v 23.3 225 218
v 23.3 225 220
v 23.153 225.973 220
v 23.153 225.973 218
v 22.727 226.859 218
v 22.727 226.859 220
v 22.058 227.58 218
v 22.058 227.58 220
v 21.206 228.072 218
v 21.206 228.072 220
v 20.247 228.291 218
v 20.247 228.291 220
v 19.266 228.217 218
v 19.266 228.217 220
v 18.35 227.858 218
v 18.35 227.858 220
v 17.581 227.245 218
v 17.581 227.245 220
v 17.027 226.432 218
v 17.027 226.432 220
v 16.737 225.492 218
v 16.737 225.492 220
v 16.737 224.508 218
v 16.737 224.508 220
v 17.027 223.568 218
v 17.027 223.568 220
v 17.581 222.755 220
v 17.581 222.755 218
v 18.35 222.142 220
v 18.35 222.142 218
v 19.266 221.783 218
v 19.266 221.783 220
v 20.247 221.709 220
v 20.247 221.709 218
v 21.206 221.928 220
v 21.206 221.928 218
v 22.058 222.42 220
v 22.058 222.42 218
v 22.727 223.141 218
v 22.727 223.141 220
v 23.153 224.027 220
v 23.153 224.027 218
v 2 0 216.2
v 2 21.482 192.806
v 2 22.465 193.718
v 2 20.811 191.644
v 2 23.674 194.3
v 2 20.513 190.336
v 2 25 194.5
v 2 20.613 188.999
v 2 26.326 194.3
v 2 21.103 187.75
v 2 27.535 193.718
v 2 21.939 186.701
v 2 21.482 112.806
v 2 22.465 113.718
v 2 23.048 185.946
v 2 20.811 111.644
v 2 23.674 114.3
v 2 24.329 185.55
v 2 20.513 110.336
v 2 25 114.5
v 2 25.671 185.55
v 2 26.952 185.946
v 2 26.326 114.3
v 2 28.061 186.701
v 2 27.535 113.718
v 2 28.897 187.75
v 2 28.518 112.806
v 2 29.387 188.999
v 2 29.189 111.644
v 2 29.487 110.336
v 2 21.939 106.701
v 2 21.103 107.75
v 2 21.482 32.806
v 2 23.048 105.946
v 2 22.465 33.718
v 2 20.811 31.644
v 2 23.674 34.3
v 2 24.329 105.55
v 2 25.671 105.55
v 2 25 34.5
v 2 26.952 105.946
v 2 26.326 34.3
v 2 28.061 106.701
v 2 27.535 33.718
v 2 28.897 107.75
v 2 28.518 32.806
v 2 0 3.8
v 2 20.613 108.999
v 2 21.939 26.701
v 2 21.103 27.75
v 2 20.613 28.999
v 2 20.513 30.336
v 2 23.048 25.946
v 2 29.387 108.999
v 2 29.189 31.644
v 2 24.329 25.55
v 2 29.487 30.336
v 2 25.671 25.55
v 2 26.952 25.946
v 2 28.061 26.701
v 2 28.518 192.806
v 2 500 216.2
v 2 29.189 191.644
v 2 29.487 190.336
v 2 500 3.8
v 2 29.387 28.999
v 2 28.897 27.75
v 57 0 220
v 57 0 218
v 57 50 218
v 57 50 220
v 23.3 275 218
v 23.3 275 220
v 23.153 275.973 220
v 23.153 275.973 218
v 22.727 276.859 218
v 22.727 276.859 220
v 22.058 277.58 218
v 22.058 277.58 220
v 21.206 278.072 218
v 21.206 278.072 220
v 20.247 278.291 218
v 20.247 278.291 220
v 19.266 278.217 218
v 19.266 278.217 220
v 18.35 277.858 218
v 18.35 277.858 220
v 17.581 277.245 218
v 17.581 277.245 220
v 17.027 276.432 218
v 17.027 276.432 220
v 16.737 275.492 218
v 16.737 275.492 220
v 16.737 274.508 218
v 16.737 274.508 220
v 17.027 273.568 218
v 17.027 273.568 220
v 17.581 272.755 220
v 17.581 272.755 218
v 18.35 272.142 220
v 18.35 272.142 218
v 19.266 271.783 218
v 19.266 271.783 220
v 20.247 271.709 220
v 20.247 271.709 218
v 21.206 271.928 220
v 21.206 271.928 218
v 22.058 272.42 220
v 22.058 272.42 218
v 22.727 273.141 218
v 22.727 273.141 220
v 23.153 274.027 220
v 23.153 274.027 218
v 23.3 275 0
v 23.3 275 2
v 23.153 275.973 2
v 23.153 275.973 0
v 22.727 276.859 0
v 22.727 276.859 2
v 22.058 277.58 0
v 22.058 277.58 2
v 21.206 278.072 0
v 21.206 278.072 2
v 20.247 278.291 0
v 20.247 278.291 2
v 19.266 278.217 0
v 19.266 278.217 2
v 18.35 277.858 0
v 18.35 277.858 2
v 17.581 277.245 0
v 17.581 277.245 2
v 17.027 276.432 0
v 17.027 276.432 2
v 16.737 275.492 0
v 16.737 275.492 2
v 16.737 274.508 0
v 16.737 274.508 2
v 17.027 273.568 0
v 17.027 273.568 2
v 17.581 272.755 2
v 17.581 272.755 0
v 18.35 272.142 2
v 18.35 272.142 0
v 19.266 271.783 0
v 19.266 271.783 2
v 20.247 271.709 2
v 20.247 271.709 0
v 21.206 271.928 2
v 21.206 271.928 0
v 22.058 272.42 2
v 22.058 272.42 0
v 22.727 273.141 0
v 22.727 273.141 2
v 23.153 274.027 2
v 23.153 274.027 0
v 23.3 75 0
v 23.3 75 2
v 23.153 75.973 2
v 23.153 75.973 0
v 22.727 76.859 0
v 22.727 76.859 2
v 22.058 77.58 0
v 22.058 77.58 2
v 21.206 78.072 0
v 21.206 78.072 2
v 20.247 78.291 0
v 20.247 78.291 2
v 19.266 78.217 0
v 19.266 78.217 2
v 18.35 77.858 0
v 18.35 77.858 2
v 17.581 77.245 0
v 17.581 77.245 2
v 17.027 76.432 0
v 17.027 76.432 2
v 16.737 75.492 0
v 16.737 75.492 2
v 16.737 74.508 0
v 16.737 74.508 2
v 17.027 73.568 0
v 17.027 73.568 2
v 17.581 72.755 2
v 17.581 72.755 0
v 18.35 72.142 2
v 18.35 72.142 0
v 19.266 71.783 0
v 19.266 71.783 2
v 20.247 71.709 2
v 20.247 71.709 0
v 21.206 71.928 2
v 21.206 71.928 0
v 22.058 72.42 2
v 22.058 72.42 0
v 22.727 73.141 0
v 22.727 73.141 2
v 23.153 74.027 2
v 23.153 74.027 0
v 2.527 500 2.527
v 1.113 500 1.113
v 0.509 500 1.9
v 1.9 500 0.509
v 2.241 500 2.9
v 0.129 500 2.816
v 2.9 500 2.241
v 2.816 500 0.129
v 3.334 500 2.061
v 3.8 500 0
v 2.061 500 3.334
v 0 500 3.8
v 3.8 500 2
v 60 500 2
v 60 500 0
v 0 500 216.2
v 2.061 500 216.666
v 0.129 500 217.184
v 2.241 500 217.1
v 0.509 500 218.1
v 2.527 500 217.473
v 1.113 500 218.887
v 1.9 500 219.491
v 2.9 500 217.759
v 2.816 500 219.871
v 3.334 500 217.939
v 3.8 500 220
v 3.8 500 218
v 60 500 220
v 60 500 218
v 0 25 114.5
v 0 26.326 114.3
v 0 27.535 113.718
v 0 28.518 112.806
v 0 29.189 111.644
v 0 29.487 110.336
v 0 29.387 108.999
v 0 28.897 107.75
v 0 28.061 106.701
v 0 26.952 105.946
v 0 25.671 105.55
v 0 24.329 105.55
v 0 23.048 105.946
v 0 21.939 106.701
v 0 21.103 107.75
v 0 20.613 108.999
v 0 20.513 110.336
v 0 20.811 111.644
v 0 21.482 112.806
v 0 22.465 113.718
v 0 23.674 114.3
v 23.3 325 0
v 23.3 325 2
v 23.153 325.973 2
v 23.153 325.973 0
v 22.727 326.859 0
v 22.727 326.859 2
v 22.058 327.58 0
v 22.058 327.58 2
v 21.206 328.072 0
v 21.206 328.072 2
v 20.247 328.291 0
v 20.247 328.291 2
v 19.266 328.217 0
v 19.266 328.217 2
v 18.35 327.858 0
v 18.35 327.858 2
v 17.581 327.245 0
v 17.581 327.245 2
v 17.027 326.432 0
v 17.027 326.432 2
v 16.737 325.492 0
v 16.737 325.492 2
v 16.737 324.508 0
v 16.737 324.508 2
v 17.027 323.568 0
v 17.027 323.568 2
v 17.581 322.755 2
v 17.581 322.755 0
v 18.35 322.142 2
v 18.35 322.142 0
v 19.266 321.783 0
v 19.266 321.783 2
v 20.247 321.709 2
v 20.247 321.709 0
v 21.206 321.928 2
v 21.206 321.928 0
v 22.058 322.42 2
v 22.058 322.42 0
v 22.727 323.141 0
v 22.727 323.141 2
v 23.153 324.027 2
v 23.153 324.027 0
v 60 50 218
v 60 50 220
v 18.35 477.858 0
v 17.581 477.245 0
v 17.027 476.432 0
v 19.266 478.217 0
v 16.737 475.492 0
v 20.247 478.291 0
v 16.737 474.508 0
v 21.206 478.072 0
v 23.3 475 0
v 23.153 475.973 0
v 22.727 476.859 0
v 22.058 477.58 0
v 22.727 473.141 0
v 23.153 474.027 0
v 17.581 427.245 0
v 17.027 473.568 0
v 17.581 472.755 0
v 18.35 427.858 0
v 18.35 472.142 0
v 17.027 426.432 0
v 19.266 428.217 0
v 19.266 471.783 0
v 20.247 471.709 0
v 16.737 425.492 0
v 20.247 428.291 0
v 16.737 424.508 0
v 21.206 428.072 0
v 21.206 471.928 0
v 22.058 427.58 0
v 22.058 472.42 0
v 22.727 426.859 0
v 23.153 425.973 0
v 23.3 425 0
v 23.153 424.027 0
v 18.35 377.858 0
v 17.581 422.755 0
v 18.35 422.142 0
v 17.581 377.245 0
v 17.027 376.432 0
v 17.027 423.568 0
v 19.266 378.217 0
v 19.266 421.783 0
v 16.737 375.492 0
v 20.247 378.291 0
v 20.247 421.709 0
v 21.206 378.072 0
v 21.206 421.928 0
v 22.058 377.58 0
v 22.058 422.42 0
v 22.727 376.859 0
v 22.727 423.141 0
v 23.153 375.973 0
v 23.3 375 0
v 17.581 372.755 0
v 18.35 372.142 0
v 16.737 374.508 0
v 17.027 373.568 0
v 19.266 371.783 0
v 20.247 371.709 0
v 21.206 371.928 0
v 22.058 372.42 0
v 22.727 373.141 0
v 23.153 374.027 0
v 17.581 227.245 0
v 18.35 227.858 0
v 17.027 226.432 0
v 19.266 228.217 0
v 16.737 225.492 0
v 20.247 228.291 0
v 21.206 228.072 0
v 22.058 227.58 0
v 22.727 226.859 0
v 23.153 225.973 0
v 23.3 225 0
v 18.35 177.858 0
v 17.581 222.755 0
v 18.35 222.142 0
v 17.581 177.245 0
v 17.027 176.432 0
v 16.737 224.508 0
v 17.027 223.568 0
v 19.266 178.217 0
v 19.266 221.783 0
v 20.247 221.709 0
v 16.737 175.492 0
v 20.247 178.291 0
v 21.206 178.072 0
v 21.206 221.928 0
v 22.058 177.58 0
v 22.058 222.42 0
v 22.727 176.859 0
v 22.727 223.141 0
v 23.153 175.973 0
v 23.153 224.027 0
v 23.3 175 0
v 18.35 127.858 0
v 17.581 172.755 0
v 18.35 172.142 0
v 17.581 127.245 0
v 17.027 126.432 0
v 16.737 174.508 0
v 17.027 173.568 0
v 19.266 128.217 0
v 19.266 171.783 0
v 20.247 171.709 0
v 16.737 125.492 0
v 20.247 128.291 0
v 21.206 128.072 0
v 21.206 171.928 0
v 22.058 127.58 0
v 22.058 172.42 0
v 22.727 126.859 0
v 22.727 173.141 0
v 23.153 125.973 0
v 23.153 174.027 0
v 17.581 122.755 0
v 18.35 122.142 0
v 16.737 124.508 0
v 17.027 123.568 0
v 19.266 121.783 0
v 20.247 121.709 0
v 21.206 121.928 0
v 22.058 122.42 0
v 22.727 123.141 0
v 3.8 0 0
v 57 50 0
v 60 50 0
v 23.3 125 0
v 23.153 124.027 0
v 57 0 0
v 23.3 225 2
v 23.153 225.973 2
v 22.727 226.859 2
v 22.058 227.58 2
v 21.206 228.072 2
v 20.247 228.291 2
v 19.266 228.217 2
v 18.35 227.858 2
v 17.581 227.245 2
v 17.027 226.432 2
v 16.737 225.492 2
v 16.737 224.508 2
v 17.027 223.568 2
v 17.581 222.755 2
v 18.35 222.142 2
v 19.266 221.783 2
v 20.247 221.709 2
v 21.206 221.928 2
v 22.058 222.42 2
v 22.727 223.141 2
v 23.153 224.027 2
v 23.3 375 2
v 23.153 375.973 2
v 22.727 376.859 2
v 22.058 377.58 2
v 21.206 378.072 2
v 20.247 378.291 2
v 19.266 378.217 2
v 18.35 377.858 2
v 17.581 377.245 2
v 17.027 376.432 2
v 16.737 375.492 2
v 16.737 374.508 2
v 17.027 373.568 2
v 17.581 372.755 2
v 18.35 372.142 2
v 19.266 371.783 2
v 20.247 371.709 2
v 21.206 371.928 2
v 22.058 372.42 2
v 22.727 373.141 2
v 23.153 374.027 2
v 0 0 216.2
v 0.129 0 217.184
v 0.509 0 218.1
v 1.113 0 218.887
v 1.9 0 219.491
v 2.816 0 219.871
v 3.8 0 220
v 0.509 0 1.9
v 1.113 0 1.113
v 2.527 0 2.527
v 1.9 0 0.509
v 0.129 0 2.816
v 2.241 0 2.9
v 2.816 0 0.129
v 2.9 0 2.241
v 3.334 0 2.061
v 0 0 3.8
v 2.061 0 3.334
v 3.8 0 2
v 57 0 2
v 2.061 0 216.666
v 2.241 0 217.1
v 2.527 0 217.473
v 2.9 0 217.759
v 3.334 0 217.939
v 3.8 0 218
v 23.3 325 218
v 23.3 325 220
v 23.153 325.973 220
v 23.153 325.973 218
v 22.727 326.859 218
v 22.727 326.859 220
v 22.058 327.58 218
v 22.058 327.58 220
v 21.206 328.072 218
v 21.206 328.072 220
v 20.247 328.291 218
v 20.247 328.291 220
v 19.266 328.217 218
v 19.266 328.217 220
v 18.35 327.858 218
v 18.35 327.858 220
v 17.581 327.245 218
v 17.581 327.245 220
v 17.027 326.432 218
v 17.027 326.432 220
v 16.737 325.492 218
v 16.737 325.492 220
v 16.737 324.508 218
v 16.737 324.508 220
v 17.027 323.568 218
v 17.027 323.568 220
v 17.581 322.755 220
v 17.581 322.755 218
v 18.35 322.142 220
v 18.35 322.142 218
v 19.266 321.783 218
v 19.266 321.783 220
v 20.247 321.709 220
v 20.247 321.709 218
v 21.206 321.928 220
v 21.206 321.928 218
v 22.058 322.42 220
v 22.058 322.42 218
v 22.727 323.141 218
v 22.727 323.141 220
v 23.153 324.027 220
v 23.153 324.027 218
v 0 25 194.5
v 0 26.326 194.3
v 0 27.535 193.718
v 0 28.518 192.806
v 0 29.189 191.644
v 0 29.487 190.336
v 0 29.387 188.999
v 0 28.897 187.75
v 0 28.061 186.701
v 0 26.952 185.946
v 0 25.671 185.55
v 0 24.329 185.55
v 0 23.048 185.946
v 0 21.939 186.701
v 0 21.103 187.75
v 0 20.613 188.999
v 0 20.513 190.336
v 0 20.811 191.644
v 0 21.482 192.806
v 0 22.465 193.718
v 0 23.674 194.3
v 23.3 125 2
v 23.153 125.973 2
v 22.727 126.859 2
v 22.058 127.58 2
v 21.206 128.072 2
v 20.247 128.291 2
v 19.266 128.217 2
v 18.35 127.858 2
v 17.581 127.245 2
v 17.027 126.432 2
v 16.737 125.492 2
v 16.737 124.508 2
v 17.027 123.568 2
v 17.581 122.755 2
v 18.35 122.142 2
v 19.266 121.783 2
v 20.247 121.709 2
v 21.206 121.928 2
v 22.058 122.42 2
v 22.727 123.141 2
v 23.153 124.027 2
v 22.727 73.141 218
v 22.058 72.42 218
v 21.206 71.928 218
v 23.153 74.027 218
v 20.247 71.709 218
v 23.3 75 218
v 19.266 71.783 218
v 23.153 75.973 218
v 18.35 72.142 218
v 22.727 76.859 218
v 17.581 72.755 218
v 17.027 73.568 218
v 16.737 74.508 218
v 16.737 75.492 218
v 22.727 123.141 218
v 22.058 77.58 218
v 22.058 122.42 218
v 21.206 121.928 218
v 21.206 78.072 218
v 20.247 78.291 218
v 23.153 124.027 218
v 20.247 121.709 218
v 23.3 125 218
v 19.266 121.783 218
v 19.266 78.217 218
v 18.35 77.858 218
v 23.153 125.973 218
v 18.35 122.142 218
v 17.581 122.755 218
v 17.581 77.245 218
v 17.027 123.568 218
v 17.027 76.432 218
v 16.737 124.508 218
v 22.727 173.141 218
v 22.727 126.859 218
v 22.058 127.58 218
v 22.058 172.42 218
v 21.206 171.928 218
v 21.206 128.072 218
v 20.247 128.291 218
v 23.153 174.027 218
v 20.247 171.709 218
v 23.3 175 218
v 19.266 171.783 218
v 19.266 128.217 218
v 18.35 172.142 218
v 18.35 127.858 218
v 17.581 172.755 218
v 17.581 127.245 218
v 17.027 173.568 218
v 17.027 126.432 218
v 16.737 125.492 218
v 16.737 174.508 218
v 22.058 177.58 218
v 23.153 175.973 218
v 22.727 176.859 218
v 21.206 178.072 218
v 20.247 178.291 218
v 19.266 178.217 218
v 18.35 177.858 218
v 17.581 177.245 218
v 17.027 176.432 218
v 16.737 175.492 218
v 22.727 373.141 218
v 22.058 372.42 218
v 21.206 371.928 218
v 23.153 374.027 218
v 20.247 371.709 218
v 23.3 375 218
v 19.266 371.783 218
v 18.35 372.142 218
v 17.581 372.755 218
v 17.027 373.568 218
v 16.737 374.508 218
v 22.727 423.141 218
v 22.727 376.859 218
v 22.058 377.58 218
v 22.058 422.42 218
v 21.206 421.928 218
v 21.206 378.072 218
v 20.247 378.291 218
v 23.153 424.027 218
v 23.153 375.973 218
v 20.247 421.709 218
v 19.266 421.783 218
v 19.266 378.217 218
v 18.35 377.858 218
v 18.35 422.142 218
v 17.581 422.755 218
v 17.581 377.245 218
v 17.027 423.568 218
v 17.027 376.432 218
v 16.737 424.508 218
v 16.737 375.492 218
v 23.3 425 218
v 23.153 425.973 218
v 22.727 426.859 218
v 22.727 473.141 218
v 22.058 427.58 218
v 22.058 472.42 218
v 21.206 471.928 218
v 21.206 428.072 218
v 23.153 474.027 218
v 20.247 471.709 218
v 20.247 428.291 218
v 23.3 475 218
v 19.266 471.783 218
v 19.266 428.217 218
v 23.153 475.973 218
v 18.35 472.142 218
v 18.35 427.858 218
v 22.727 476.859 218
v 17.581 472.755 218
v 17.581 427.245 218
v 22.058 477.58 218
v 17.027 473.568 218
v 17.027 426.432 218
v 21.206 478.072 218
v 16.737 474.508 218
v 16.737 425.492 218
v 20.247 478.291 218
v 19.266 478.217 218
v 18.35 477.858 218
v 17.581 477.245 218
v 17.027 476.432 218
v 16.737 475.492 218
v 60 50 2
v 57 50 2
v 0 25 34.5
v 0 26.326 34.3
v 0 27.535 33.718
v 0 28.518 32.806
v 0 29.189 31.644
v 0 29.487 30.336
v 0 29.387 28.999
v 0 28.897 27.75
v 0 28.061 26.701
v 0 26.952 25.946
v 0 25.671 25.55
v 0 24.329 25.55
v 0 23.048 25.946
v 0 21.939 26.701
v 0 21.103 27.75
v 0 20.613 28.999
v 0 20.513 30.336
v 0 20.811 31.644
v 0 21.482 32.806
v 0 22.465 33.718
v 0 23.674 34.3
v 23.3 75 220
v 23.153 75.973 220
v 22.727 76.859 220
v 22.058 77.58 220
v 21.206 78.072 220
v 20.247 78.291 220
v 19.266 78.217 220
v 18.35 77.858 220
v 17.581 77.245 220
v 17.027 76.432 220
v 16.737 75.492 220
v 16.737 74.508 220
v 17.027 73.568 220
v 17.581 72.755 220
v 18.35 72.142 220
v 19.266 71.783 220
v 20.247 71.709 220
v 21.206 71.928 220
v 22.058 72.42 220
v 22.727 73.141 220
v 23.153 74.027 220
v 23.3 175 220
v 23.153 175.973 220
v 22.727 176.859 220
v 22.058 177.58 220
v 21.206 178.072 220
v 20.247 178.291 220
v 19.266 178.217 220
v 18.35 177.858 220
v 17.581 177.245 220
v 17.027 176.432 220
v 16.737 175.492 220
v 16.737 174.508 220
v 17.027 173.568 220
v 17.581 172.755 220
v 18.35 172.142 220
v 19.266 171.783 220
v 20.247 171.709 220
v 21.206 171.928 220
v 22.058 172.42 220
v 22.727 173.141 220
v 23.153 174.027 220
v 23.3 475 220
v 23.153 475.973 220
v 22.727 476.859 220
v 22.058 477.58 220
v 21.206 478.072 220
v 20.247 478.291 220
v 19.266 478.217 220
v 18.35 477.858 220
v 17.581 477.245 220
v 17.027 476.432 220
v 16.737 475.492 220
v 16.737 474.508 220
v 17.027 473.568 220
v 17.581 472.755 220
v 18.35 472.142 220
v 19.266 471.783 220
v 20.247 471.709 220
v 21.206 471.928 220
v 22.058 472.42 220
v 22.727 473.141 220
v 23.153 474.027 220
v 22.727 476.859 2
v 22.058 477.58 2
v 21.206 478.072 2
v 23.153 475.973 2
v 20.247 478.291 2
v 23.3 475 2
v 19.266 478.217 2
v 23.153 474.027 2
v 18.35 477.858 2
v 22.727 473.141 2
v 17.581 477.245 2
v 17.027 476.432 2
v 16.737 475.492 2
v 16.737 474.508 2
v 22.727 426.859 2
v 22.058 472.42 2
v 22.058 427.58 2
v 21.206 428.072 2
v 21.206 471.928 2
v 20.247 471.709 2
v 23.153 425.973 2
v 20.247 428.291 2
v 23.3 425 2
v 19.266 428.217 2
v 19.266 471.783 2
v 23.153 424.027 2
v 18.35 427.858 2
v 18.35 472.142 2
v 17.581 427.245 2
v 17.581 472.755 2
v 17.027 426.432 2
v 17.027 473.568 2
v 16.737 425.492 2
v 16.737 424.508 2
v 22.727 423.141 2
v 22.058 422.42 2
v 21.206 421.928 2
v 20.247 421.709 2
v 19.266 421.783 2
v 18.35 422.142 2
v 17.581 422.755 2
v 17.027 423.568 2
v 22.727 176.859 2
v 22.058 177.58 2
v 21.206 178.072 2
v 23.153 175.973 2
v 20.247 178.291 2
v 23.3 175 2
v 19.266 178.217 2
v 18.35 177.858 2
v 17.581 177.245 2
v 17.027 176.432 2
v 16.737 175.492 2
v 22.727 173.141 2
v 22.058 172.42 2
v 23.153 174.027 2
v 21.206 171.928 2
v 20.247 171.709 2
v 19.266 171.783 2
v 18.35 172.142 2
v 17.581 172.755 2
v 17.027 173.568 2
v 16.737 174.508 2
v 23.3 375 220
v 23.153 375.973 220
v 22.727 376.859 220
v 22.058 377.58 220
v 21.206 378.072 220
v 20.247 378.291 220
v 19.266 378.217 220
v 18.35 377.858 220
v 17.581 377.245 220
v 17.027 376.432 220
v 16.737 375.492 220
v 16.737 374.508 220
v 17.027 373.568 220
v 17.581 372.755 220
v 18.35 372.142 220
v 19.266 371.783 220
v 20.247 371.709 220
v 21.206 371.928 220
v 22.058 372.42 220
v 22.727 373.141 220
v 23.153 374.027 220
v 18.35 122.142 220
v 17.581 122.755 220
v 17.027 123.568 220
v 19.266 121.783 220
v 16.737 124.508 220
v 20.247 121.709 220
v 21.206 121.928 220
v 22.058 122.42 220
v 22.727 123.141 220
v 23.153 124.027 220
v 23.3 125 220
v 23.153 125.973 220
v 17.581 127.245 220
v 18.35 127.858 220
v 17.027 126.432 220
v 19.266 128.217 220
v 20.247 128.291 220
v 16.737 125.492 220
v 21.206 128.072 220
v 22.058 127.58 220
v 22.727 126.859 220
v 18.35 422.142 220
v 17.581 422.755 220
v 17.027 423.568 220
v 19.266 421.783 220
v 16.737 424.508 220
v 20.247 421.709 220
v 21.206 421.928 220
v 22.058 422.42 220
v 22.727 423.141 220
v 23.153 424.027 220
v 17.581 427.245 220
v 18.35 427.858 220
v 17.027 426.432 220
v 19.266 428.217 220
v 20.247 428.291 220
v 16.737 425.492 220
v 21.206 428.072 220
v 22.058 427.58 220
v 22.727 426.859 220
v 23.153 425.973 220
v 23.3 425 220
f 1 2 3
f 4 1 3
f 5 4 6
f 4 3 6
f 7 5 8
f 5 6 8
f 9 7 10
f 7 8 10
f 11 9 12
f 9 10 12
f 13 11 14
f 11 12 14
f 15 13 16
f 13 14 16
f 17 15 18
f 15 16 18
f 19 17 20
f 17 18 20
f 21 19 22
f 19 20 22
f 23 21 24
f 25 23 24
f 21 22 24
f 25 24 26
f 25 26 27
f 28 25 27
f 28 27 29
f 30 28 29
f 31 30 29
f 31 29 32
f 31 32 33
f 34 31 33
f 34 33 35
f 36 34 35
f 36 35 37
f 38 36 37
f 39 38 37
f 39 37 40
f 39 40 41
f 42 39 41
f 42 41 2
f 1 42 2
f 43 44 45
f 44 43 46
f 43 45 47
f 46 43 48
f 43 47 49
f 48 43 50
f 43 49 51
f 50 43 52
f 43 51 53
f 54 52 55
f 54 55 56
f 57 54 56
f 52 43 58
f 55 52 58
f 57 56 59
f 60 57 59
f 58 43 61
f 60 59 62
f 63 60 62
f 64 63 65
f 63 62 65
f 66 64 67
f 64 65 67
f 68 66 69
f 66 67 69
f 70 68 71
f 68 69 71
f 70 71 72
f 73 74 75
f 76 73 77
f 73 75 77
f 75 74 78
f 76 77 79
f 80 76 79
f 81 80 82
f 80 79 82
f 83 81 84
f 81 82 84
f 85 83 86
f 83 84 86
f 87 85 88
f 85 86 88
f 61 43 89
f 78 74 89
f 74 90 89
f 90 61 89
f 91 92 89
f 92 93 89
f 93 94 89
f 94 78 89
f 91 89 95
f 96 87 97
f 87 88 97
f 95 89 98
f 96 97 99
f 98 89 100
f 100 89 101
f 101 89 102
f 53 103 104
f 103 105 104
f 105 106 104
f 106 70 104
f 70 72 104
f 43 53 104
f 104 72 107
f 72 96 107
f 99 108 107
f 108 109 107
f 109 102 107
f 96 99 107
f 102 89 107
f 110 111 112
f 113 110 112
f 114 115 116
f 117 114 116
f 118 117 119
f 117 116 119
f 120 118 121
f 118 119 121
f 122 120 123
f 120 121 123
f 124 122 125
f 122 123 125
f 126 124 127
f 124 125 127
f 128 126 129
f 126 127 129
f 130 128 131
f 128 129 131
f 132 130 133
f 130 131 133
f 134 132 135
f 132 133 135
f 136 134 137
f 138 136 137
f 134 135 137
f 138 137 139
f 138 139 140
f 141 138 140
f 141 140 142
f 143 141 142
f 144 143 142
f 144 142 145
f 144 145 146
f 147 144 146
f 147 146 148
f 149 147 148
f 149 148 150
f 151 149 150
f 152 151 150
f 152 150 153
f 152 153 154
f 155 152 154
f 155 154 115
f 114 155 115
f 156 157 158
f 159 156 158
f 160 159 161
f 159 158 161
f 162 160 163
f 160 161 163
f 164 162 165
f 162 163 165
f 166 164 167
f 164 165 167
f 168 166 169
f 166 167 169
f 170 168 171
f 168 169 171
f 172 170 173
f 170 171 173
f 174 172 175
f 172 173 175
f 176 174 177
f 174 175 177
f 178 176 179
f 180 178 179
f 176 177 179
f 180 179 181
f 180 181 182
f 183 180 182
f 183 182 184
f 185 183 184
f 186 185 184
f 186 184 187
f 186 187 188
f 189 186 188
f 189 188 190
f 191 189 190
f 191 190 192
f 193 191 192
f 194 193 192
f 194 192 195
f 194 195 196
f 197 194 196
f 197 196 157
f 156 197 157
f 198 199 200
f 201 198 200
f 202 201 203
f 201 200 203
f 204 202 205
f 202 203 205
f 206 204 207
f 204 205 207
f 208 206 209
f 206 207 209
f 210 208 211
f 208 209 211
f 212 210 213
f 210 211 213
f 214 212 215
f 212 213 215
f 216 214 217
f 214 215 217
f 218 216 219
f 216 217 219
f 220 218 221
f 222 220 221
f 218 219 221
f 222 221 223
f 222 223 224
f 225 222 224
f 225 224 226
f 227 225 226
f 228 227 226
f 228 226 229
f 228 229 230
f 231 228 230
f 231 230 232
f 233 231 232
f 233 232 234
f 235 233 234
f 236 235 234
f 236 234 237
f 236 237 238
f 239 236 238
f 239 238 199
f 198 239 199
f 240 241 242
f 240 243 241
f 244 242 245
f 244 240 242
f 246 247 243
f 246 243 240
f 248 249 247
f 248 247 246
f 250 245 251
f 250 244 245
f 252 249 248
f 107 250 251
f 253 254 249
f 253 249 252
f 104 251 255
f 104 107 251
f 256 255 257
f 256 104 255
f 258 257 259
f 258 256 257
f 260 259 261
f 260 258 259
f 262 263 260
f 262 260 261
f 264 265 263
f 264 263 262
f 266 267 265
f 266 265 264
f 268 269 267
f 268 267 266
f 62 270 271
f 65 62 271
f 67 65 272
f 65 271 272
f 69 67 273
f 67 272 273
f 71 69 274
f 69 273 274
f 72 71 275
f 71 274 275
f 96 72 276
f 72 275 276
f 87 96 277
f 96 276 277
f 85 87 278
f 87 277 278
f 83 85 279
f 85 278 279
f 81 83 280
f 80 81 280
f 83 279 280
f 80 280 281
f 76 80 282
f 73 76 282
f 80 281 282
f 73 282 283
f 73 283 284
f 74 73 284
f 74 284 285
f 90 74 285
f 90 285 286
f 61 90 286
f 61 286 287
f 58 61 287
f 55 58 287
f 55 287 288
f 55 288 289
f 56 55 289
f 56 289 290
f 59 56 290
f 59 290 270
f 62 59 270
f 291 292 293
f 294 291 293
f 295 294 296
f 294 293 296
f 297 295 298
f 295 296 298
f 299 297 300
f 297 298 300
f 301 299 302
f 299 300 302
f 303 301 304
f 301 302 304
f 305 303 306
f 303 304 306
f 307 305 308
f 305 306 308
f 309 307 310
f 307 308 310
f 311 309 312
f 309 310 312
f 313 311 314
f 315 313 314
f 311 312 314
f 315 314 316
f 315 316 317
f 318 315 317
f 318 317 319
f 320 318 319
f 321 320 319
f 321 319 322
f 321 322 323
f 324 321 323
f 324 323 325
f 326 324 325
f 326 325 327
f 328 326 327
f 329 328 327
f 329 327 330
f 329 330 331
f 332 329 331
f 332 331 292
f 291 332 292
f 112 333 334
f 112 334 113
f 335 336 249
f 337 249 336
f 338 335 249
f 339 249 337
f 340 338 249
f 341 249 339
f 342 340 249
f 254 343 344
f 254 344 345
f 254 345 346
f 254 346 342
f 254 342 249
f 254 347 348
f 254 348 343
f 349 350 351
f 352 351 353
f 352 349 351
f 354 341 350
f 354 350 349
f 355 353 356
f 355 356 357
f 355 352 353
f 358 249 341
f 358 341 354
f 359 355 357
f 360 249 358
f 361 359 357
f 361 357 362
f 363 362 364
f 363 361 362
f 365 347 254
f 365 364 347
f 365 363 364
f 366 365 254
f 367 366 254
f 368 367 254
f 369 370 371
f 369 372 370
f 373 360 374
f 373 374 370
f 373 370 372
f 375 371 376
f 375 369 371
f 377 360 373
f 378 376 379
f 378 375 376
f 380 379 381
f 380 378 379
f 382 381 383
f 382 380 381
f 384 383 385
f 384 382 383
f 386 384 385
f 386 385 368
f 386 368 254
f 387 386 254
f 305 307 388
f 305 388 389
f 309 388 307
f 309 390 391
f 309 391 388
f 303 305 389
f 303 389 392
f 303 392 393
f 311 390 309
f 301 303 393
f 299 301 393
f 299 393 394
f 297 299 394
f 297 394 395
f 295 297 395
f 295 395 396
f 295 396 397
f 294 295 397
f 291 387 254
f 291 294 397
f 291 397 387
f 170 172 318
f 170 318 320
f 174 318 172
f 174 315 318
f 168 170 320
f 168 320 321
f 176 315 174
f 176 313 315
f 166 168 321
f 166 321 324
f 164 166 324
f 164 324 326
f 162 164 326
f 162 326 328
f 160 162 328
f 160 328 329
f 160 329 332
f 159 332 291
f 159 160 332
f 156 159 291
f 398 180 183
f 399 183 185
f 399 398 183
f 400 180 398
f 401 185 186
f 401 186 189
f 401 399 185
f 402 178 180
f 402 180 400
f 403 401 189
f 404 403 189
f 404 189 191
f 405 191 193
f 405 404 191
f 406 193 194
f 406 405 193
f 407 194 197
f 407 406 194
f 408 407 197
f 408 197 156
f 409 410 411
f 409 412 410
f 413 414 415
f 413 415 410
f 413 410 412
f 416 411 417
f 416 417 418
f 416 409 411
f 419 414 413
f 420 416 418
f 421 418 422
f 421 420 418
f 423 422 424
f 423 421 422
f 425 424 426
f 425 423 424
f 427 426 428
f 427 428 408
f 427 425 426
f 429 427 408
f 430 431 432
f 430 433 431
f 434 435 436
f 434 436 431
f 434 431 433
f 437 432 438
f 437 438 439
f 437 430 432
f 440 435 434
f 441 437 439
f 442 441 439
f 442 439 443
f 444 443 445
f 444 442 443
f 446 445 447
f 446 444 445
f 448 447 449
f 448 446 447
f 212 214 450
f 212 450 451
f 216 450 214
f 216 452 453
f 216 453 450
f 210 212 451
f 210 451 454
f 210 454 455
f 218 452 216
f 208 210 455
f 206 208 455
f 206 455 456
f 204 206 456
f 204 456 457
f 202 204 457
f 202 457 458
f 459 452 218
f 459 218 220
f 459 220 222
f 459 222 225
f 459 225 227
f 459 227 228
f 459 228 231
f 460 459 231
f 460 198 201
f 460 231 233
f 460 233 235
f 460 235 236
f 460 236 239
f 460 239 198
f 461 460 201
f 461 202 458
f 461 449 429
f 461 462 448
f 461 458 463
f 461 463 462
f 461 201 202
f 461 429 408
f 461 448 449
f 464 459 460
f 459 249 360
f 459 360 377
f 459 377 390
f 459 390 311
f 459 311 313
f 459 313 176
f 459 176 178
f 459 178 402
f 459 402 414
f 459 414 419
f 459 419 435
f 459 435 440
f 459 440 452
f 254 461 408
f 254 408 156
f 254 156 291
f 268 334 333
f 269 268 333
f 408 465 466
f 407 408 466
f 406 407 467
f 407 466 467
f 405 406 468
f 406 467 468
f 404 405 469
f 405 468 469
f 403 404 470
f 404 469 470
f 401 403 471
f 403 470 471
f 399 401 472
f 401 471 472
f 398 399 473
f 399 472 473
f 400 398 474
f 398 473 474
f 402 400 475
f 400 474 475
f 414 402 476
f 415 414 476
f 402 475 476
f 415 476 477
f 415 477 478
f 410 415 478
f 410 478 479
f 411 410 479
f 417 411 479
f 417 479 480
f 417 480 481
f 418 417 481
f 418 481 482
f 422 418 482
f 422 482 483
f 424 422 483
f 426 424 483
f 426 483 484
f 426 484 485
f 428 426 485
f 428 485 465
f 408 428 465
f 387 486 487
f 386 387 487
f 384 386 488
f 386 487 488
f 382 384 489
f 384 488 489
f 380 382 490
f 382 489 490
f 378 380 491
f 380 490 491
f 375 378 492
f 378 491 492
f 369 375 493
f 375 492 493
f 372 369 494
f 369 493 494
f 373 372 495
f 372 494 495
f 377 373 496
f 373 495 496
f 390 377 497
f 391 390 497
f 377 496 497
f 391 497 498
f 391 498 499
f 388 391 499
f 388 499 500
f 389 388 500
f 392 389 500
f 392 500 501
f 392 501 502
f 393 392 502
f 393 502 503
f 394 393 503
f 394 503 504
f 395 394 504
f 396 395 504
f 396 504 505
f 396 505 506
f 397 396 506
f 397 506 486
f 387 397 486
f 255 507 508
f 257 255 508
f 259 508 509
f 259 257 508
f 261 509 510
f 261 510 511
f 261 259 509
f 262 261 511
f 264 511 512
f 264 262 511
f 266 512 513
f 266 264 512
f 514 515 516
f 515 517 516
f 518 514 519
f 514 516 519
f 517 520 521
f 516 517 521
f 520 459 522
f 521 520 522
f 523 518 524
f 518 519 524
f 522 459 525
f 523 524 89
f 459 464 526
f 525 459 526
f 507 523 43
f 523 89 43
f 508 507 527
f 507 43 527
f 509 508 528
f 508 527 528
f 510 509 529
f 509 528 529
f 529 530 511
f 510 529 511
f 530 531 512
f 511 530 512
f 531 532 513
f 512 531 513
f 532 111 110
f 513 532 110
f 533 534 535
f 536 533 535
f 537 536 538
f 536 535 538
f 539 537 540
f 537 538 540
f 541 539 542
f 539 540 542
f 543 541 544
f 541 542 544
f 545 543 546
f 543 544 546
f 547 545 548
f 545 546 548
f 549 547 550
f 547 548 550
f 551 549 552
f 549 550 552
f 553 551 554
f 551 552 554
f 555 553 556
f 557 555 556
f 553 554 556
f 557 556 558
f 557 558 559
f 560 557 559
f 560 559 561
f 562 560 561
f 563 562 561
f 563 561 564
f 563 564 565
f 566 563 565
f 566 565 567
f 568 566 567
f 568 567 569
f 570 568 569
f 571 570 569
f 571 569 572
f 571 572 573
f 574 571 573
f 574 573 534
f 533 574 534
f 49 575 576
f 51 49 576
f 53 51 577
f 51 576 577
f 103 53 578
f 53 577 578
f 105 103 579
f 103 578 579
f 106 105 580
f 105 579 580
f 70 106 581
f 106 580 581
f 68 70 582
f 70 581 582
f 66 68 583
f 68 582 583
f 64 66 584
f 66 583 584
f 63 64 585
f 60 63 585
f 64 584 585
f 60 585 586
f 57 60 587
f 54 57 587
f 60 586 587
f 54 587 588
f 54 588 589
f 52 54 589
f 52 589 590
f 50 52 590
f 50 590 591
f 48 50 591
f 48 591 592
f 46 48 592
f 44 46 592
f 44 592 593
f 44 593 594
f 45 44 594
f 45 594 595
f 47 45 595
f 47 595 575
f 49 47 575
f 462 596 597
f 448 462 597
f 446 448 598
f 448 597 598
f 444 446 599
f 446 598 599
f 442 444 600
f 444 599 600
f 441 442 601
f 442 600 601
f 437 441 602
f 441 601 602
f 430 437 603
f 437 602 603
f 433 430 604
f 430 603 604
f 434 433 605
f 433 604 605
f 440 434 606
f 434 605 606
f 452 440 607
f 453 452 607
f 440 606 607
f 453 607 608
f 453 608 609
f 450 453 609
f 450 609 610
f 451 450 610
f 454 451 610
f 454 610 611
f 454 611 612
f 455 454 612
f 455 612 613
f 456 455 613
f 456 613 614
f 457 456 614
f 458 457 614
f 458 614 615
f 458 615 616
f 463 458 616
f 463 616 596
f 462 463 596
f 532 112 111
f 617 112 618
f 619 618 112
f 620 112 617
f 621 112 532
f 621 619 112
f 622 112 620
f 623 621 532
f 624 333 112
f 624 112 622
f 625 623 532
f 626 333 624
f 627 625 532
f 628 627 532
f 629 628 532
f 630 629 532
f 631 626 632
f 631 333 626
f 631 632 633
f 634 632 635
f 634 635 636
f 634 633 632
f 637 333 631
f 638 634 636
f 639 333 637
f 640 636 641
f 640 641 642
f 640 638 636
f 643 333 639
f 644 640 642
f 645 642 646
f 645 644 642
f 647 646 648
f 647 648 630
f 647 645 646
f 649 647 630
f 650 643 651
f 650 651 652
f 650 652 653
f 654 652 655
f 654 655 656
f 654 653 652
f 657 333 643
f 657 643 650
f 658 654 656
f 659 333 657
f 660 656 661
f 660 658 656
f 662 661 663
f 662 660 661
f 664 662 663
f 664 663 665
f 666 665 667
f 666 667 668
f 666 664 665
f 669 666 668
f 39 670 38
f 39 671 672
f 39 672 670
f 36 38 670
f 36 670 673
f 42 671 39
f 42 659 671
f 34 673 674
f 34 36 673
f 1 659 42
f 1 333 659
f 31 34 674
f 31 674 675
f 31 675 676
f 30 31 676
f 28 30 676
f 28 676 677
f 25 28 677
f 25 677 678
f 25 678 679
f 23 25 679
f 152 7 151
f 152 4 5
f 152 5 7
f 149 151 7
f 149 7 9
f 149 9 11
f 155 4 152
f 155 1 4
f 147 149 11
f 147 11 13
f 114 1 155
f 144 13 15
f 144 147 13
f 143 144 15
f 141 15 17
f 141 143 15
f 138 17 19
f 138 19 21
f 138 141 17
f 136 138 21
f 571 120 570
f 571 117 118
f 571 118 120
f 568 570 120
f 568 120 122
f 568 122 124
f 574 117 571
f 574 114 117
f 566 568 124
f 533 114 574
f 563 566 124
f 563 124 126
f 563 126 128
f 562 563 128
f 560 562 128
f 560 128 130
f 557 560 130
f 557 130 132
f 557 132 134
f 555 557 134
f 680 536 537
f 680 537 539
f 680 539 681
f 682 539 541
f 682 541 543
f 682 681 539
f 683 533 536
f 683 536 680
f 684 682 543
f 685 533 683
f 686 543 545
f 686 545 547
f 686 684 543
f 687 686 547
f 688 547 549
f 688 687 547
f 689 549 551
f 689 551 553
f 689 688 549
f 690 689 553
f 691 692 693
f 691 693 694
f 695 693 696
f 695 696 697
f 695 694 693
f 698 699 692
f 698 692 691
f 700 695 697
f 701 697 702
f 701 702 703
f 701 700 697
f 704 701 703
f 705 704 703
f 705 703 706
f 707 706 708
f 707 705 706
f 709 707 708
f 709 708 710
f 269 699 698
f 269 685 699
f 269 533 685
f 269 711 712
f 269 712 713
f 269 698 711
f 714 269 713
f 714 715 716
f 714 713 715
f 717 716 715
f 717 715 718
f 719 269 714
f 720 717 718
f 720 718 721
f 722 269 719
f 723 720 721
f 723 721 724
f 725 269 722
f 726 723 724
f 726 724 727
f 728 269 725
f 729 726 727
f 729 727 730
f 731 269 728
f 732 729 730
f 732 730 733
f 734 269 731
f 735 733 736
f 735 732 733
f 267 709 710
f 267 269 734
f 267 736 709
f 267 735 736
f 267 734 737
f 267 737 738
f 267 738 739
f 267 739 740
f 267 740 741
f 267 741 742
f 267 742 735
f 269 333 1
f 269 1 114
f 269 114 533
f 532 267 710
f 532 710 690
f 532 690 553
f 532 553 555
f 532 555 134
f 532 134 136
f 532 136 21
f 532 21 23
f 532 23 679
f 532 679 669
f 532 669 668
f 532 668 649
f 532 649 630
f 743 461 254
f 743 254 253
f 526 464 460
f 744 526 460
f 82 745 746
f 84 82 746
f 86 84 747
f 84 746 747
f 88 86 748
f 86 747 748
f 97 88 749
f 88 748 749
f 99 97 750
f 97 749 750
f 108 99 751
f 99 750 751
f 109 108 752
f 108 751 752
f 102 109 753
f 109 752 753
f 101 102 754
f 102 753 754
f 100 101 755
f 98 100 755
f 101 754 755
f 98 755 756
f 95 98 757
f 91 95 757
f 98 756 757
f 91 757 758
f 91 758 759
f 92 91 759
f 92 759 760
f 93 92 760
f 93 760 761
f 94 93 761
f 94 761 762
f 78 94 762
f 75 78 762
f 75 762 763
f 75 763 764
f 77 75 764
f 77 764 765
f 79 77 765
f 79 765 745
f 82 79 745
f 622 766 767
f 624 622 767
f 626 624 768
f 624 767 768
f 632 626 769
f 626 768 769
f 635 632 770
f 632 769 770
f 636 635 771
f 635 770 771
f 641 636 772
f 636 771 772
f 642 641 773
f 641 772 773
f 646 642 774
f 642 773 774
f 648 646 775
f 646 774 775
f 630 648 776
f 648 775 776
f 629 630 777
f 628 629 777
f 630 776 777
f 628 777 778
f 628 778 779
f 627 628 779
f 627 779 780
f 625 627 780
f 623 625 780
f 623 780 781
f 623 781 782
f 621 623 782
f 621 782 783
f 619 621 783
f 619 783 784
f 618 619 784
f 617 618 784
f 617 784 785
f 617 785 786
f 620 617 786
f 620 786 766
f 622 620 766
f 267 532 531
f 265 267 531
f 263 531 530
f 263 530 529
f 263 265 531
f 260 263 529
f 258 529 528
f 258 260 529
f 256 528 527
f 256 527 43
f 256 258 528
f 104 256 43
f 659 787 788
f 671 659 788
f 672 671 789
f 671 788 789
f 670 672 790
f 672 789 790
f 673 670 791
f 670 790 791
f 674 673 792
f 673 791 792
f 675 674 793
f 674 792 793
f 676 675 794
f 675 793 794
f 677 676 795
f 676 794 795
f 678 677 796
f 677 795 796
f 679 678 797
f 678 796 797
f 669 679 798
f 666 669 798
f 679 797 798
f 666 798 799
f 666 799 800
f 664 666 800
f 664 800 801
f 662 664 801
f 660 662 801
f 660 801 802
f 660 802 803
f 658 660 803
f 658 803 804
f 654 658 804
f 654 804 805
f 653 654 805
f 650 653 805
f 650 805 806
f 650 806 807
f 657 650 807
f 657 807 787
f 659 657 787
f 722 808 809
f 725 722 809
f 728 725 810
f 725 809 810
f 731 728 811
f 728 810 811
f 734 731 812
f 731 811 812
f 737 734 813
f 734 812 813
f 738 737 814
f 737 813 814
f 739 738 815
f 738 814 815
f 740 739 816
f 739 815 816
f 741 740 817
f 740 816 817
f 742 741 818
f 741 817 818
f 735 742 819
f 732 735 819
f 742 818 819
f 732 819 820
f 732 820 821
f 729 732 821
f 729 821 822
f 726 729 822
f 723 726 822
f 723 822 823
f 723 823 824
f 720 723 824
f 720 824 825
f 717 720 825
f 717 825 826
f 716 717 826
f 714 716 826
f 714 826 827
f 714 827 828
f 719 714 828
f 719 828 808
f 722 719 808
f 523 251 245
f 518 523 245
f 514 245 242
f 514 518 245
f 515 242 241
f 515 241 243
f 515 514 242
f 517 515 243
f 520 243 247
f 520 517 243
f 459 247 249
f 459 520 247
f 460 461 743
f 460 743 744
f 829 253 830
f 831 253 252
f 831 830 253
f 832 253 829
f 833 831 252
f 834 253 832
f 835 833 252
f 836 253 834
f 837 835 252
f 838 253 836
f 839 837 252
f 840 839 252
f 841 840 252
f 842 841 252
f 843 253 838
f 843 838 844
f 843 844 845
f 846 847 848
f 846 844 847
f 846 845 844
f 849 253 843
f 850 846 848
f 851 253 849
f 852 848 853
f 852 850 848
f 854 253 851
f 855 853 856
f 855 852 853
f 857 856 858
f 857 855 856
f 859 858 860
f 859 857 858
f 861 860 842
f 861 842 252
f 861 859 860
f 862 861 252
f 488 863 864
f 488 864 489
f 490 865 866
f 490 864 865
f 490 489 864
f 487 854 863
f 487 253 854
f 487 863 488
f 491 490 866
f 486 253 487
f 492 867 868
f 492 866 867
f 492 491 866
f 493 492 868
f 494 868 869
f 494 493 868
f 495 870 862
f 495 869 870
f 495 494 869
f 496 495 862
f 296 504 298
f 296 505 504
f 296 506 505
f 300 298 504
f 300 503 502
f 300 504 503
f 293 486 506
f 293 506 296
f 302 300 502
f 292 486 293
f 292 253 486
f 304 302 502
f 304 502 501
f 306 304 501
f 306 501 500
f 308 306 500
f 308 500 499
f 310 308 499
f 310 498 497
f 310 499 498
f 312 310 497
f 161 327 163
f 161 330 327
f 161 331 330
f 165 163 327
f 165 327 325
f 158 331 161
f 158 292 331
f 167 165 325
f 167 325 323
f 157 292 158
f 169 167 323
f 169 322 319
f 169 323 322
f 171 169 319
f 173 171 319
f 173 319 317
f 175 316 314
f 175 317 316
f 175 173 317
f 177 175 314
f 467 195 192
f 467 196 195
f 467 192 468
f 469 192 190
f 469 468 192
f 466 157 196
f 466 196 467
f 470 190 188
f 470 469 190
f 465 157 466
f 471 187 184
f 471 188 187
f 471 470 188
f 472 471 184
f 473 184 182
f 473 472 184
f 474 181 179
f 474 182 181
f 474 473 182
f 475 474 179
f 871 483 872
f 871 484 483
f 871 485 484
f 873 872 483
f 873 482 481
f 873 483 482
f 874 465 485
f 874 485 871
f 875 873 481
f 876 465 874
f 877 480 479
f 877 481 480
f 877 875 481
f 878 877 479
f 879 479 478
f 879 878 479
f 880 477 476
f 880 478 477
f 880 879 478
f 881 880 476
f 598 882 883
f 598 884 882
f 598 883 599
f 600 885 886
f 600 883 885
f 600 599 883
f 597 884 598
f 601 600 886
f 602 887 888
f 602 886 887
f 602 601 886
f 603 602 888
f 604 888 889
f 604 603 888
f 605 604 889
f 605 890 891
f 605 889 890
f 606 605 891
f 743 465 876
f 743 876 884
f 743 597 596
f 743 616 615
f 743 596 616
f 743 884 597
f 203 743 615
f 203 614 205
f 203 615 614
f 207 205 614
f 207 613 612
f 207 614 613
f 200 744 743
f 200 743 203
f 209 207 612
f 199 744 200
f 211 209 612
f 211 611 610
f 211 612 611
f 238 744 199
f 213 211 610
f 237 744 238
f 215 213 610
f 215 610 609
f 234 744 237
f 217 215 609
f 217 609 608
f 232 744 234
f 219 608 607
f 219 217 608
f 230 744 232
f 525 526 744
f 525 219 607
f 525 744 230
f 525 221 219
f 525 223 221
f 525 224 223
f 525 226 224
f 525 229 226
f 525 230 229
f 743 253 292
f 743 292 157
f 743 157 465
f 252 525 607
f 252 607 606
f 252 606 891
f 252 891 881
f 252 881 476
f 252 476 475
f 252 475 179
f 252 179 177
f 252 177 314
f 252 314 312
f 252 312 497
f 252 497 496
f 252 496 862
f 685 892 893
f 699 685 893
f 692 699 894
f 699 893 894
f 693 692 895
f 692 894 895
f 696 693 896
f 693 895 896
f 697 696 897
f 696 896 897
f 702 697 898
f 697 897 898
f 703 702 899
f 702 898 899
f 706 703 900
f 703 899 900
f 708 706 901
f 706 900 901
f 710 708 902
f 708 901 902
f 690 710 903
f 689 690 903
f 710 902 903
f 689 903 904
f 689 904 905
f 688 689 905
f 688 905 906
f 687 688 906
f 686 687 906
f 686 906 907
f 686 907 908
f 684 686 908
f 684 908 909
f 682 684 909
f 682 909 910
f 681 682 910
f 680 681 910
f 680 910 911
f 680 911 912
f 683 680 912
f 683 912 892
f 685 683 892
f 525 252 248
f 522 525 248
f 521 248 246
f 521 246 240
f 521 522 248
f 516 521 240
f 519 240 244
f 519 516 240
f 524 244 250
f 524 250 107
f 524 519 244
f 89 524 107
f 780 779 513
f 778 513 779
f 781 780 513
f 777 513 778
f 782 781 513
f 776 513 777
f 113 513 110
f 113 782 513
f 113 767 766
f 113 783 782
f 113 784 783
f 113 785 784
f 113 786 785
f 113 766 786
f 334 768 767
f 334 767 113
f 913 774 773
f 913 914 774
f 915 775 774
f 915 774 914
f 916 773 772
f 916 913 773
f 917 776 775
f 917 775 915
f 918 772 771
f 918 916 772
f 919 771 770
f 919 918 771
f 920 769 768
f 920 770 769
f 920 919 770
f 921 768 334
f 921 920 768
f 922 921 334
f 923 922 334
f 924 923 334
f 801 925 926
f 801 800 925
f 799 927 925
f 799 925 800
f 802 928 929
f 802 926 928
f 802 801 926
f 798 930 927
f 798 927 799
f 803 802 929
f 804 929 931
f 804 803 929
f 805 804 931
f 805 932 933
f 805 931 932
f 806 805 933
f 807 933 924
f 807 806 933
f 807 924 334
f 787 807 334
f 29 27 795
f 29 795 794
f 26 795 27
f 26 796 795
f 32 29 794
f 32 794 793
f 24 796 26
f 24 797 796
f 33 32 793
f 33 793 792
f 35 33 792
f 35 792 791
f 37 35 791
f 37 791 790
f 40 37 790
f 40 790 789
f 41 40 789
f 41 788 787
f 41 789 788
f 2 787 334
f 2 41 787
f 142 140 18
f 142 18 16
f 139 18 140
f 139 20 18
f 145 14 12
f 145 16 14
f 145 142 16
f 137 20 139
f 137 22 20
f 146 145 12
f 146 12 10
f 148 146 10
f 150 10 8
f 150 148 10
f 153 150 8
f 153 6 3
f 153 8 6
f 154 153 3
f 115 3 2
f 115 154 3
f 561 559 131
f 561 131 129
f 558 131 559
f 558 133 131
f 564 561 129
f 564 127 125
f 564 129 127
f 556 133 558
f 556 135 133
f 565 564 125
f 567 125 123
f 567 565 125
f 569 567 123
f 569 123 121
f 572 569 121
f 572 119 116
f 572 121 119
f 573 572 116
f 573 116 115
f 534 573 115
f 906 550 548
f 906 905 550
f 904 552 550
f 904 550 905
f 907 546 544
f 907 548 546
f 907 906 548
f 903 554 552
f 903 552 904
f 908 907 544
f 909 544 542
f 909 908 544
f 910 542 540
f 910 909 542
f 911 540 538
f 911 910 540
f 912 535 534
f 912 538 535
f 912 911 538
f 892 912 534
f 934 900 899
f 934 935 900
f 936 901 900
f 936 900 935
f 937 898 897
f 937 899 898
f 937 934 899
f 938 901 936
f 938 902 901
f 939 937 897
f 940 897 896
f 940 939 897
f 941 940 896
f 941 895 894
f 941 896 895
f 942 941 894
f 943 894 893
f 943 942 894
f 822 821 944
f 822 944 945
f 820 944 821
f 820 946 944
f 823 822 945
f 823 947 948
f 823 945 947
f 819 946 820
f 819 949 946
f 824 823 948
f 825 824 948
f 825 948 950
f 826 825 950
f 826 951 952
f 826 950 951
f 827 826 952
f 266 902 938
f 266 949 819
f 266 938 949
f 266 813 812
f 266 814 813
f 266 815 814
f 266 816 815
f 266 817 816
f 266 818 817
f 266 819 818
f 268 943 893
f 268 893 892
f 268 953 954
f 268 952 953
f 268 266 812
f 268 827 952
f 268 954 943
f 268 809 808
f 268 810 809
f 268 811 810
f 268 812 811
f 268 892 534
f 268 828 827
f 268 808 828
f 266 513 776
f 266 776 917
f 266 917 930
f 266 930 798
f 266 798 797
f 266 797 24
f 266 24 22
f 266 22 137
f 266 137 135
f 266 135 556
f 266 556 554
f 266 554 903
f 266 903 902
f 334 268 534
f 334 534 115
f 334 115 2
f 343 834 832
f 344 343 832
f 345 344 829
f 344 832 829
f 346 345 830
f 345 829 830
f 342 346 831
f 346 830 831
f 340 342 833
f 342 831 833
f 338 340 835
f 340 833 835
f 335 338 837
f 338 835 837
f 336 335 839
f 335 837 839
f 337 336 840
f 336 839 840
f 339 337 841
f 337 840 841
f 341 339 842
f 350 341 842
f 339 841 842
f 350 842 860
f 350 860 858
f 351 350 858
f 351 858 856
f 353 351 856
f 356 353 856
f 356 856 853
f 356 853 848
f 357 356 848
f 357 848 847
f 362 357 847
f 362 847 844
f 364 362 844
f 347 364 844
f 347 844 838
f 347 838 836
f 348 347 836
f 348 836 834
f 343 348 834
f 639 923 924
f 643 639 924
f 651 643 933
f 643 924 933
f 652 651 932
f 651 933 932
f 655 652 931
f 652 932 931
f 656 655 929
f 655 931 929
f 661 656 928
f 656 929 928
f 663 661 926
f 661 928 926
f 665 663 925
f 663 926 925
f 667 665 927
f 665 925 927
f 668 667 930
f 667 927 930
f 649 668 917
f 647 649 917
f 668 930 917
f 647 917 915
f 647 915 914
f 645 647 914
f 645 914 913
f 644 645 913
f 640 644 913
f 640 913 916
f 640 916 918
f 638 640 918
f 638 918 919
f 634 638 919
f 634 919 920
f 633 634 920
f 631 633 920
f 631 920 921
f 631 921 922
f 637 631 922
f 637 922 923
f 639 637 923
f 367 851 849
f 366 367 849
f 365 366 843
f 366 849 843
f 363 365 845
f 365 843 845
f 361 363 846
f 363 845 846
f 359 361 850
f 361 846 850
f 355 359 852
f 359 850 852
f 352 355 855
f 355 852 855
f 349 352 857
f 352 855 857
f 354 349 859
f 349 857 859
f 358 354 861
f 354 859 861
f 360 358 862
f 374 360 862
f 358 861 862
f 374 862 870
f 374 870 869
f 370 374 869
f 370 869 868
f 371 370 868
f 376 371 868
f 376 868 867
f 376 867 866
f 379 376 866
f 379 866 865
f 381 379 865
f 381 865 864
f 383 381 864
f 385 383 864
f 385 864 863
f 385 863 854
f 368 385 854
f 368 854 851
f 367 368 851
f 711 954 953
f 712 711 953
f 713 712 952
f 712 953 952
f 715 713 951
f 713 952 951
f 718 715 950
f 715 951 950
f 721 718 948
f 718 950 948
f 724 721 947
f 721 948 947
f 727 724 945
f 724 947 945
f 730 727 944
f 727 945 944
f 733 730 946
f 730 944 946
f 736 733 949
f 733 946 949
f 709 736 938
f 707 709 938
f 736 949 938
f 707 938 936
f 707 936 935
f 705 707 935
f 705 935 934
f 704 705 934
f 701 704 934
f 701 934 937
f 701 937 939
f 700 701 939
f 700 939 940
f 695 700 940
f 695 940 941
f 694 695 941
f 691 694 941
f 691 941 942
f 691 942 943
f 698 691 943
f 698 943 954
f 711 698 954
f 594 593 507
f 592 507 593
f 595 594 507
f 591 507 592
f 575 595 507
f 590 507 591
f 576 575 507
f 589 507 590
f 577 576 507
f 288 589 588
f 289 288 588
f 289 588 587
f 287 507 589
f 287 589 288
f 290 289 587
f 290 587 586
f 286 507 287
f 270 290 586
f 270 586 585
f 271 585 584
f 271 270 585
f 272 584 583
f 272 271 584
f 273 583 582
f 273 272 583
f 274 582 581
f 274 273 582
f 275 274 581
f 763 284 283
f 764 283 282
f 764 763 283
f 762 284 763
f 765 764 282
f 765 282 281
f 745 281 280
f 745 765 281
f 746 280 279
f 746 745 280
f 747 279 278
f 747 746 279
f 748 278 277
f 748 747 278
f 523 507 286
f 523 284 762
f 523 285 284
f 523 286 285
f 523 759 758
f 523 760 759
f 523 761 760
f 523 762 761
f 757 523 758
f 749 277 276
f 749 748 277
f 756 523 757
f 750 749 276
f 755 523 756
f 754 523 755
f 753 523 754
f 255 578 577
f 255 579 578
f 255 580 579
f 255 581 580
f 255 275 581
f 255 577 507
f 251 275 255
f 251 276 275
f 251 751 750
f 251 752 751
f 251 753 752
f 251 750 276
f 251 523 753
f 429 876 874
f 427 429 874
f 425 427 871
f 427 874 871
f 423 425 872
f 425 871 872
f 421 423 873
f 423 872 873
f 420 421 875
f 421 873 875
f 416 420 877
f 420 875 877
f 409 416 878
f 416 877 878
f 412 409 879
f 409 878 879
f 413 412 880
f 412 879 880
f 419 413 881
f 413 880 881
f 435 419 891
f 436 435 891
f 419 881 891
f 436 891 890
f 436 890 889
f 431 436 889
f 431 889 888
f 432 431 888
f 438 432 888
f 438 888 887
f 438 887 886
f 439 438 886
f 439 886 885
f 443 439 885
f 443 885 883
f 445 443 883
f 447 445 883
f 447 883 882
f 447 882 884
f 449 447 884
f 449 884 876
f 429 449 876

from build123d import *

# Parameters (mm, degrees)
SKETCH_1_W                         = 2
SKETCH_1_H                         = 500
SM_BASE_FLANGE_1_DEPTH             = 220
SM_EDGE_FLANGE_1_STRIP_W           = 11.6
SM_EDGE_FLANGE_1_STRIP_H           = 2
SM_EDGE_FLANGE_1_STRIP_CUT_DEPTH   = 500
SM_EDGE_FLANGE_1_STRIP_2_W         = 11.6
SM_EDGE_FLANGE_1_STRIP_2_H         = 2
SM_EDGE_FLANGE_1_STRIP_CUT_2_DEPTH = 500
SM_EDGE_FLANGE_1_DEPTH             = 500
SM_EDGE_FLANGE_1_BEND_DEPTH        = 500
SKETCH_10_W                        = 3
SKETCH_10_H                        = 50
CUT_EXTRUDE_1_DEPTH                = 550.545266561
HOLE_WIZARD_M81_D                  = 9
HOLE_WIZARD_M81_DEPTH              = 5
HOLE_WIZARD_M81_TIP                = 2.703872786
HOLE_WIZARD_M61_D                  = 6.6


# Sheet-metal steps are written as plain solids
with BuildPart() as part:
    # Sketch 1 → Базовая кромка1 (new body)
    with BuildSketch(Plane.XY):
        with Locations((1, 250)):
            Rectangle(SKETCH_1_W, SKETCH_1_H)
    extrude(amount=SM_BASE_FLANGE_1_DEPTH)

    # Ребро-кромка1 strip (across the edge) → Ребро-кромка1 strip cut (cut)
    with BuildSketch(Plane(origin=(2, 0, 0), x_dir=(0, 0, 1), z_dir=(0, 1, 0))):
        with Locations((-2, -1)):
            Rectangle(SM_EDGE_FLANGE_1_STRIP_W, SM_EDGE_FLANGE_1_STRIP_H)
    extrude(amount=SM_EDGE_FLANGE_1_STRIP_CUT_DEPTH, mode=Mode.SUBTRACT)

    # Ребро-кромка1 strip 2 (across the edge) → Ребро-кромка1 strip cut 2 (cut)
    with BuildSketch(Plane(origin=(2, 500, 220), x_dir=(0, 0, -1), z_dir=(0, -1, 0))):
        with Locations((-2, -1)):
            Rectangle(SM_EDGE_FLANGE_1_STRIP_2_W, SM_EDGE_FLANGE_1_STRIP_2_H)
    extrude(amount=SM_EDGE_FLANGE_1_STRIP_CUT_2_DEPTH, mode=Mode.SUBTRACT)

    # Ребро-кромка1 section (across the edge) → Ребро-кромка1 (add)
    with BuildSketch(Plane(origin=(2, 0, 0), x_dir=(0, 0, 1), z_dir=(0, 1, 0))):
        with BuildLine():
            Line((0, 1.8), (0, 58))
            Line((0, 58), (2, 58))
            Line((2, 58), (2, 1.8))
            ThreePointArc((2, 1.8), (2.527207794, 0.527207794), (3.8, 0))
            Line((3.8, 0), (3.8, -2))
            ThreePointArc((3.8, -2), (1.112994231, -0.887005769), (0, 1.8))
        make_face()
    extrude(amount=SM_EDGE_FLANGE_1_DEPTH)

    # Ребро-кромка1 section 2 (across the edge) → Ребро-кромка1 bend (add)
    with BuildSketch(Plane(origin=(2, 500, 220), x_dir=(0, 0, -1), z_dir=(0, -1, 0))):
        with BuildLine():
            Line((0, 1.8), (0, 58))
            Line((0, 58), (2, 58))
            Line((2, 58), (2, 1.8))
            ThreePointArc((2, 1.8), (2.527207794, 0.527207794), (3.8, 0))
            Line((3.8, 0), (3.8, -2))
            ThreePointArc((3.8, -2), (1.112994231, -0.887005769), (0, 1.8))
        make_face()
    extrude(amount=SM_EDGE_FLANGE_1_BEND_DEPTH)

    # Эскиз10 → Вырез-Вытянуть1 (cut, through all)
    with BuildSketch(Plane(origin=(0, 0, 0), x_dir=(-1, 0, 0), z_dir=(0, 0, -1))):
        with Locations((-58.5, 25)):
            Rectangle(SKETCH_10_W, SKETCH_10_H)
    extrude(amount=-CUT_EXTRUDE_1_DEPTH, mode=Mode.SUBTRACT)

    # Отверстие с зазором M81
    with Locations(Plane(origin=(2, 0, 0), x_dir=(0, 0, -1), z_dir=(1, 0, 0))):
        with Locations((-30, 25), (-110, 25), (-190, 25)):
            Hole(HOLE_WIZARD_M81_D / 2, depth=HOLE_WIZARD_M81_DEPTH)
            with Locations((0, 0, -(HOLE_WIZARD_M81_DEPTH + HOLE_WIZARD_M81_TIP / 2))):  # 118° drill point
                Cone(0, HOLE_WIZARD_M81_D / 2, HOLE_WIZARD_M81_TIP, mode=Mode.SUBTRACT)

    # Отверстие с зазором M61 (through all)
    with Locations(Plane(origin=(0, 0, 0), x_dir=(-1, 0, 0), z_dir=(0, 0, -1))):
        with Locations((-20, 475), (-20, 425), (-20, 375), (-20, 325), (-20, 275), (-20, 225), (-20, 175), (-20, 125), (-20, 75)):
            Hole(HOLE_WIZARD_M61_D / 2)


solid = part.part
